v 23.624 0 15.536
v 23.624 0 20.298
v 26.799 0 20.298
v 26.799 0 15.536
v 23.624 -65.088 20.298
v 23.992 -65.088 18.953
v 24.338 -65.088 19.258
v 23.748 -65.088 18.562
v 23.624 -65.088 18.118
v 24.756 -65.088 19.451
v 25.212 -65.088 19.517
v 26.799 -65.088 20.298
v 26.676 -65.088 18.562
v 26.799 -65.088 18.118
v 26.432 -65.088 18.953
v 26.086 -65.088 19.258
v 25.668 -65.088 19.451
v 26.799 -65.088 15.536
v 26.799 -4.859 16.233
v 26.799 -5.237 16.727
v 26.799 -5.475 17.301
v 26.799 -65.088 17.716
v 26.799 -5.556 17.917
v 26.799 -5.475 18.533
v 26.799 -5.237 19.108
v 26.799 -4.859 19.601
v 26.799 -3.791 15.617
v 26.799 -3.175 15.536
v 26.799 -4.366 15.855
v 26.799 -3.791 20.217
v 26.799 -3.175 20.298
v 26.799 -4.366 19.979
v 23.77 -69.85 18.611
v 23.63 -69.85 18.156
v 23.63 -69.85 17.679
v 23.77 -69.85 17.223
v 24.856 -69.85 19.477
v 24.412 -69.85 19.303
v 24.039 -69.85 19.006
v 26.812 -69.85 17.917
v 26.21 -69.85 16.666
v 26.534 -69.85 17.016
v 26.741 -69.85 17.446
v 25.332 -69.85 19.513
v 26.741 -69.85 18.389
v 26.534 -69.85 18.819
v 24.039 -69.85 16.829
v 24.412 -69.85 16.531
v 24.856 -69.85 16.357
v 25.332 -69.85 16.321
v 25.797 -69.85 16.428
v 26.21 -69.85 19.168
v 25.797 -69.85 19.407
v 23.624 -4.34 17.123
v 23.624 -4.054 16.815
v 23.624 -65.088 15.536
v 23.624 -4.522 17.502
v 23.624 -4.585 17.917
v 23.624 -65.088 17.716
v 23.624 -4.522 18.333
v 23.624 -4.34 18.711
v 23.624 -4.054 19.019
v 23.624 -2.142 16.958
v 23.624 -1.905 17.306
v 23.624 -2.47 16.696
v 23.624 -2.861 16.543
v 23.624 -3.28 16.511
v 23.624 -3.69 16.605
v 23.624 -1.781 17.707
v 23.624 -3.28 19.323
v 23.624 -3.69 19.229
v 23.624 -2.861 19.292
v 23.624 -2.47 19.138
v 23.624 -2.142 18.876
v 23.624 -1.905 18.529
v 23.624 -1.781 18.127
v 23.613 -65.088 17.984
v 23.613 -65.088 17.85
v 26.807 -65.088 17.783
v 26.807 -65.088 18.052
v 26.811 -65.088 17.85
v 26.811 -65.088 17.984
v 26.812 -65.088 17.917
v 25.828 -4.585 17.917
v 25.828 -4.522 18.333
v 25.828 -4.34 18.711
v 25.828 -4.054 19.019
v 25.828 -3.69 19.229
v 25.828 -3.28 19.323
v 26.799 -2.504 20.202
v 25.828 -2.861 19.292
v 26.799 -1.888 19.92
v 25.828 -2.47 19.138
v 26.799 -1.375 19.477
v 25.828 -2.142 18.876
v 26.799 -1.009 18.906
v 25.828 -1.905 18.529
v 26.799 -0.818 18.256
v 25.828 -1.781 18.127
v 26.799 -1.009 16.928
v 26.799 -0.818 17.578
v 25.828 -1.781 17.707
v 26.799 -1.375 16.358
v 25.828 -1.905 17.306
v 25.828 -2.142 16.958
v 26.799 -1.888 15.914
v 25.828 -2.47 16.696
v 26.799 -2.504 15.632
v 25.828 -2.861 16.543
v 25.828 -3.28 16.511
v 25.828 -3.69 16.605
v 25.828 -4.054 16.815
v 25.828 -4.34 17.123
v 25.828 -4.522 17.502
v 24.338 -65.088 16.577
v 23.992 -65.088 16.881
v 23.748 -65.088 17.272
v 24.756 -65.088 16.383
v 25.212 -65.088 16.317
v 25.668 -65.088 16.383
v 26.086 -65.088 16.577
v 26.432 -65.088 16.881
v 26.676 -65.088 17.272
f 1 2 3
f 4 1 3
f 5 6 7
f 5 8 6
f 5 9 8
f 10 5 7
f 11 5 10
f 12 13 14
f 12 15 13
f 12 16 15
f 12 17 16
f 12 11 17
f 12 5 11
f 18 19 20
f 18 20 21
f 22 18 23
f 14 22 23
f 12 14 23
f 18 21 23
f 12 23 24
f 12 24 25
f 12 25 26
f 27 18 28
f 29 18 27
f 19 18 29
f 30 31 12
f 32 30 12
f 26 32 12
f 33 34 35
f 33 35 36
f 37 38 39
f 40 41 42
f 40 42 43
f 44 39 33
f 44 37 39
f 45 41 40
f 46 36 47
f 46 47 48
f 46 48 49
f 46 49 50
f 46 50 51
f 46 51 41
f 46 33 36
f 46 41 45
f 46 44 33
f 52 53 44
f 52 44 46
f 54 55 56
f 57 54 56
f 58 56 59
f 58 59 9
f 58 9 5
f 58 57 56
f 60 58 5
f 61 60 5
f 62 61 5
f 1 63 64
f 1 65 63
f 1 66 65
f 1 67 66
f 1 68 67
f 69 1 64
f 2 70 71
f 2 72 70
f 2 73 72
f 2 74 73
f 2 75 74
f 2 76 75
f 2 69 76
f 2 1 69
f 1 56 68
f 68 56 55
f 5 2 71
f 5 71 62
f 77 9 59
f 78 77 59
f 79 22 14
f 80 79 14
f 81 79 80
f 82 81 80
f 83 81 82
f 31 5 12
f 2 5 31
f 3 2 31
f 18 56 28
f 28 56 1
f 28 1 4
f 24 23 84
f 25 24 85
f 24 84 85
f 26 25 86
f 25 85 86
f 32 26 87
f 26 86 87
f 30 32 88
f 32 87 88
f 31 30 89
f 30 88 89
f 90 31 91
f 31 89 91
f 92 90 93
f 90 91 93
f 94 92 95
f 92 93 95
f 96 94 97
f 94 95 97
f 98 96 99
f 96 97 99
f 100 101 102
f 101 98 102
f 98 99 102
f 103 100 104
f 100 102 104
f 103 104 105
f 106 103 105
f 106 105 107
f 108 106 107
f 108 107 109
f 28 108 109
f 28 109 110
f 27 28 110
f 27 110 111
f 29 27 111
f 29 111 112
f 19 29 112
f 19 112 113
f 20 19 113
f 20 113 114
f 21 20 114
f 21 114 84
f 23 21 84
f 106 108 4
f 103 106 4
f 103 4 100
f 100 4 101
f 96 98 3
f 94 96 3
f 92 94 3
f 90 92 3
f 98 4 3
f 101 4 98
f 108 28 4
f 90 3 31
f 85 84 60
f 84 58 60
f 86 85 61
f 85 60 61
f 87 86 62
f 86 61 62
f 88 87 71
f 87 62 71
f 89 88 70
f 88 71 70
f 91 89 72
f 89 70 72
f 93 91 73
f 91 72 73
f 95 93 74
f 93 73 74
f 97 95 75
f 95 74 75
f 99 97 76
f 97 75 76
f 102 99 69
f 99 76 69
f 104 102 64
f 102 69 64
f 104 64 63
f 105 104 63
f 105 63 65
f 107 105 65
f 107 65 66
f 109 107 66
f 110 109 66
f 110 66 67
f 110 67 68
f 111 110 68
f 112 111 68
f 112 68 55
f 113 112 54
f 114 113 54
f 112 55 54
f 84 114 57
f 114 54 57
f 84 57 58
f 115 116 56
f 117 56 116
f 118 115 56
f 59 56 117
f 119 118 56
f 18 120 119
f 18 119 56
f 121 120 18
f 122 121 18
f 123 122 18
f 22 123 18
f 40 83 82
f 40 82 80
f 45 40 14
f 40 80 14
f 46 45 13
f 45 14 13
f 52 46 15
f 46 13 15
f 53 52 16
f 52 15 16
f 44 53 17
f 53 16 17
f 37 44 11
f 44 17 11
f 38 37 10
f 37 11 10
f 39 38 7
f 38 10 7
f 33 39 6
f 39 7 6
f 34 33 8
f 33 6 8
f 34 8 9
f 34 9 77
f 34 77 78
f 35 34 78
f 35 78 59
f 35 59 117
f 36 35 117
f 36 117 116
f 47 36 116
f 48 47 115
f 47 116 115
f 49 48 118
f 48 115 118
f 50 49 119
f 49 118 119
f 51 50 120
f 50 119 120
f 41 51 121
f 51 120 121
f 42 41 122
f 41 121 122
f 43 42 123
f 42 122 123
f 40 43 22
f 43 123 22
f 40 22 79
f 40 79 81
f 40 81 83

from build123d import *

# Parameters (mm, degrees)
F0_W           = 3.175
F0_H           = 4.7625
F1_DEPTH       = 65.0875
F2_R           = 1.6002
F3_DEPTH       = 4.7625
F5_D           = 2.8194
F5_CSINK_D     = 4.7625
F5_CSINK_ANGLE = 90


with BuildPart() as f1:
    # F0 (on Front) → F1 (new body)
    with BuildSketch(Plane.XZ):
        with Locations((25.211968, 17.917172)):
            Rectangle(F0_W, F0_H)
    extrude(amount=F1_DEPTH)

    # F2 (on face) → F3 (join)
    with BuildSketch(Plane.XZ.offset(65.0875)):
        with Locations((25.211968, 17.917172)):
            Circle(F2_R)
    extrude(amount=F3_DEPTH)

    # F5 (through all)
    with Locations(Plane.YZ.offset(26.799468)):
        with Locations((-3.175, 17.917172)):
            CounterSinkHole(F5_D / 2, F5_CSINK_D / 2, counter_sink_angle=F5_CSINK_ANGLE)


solid = f1.part
